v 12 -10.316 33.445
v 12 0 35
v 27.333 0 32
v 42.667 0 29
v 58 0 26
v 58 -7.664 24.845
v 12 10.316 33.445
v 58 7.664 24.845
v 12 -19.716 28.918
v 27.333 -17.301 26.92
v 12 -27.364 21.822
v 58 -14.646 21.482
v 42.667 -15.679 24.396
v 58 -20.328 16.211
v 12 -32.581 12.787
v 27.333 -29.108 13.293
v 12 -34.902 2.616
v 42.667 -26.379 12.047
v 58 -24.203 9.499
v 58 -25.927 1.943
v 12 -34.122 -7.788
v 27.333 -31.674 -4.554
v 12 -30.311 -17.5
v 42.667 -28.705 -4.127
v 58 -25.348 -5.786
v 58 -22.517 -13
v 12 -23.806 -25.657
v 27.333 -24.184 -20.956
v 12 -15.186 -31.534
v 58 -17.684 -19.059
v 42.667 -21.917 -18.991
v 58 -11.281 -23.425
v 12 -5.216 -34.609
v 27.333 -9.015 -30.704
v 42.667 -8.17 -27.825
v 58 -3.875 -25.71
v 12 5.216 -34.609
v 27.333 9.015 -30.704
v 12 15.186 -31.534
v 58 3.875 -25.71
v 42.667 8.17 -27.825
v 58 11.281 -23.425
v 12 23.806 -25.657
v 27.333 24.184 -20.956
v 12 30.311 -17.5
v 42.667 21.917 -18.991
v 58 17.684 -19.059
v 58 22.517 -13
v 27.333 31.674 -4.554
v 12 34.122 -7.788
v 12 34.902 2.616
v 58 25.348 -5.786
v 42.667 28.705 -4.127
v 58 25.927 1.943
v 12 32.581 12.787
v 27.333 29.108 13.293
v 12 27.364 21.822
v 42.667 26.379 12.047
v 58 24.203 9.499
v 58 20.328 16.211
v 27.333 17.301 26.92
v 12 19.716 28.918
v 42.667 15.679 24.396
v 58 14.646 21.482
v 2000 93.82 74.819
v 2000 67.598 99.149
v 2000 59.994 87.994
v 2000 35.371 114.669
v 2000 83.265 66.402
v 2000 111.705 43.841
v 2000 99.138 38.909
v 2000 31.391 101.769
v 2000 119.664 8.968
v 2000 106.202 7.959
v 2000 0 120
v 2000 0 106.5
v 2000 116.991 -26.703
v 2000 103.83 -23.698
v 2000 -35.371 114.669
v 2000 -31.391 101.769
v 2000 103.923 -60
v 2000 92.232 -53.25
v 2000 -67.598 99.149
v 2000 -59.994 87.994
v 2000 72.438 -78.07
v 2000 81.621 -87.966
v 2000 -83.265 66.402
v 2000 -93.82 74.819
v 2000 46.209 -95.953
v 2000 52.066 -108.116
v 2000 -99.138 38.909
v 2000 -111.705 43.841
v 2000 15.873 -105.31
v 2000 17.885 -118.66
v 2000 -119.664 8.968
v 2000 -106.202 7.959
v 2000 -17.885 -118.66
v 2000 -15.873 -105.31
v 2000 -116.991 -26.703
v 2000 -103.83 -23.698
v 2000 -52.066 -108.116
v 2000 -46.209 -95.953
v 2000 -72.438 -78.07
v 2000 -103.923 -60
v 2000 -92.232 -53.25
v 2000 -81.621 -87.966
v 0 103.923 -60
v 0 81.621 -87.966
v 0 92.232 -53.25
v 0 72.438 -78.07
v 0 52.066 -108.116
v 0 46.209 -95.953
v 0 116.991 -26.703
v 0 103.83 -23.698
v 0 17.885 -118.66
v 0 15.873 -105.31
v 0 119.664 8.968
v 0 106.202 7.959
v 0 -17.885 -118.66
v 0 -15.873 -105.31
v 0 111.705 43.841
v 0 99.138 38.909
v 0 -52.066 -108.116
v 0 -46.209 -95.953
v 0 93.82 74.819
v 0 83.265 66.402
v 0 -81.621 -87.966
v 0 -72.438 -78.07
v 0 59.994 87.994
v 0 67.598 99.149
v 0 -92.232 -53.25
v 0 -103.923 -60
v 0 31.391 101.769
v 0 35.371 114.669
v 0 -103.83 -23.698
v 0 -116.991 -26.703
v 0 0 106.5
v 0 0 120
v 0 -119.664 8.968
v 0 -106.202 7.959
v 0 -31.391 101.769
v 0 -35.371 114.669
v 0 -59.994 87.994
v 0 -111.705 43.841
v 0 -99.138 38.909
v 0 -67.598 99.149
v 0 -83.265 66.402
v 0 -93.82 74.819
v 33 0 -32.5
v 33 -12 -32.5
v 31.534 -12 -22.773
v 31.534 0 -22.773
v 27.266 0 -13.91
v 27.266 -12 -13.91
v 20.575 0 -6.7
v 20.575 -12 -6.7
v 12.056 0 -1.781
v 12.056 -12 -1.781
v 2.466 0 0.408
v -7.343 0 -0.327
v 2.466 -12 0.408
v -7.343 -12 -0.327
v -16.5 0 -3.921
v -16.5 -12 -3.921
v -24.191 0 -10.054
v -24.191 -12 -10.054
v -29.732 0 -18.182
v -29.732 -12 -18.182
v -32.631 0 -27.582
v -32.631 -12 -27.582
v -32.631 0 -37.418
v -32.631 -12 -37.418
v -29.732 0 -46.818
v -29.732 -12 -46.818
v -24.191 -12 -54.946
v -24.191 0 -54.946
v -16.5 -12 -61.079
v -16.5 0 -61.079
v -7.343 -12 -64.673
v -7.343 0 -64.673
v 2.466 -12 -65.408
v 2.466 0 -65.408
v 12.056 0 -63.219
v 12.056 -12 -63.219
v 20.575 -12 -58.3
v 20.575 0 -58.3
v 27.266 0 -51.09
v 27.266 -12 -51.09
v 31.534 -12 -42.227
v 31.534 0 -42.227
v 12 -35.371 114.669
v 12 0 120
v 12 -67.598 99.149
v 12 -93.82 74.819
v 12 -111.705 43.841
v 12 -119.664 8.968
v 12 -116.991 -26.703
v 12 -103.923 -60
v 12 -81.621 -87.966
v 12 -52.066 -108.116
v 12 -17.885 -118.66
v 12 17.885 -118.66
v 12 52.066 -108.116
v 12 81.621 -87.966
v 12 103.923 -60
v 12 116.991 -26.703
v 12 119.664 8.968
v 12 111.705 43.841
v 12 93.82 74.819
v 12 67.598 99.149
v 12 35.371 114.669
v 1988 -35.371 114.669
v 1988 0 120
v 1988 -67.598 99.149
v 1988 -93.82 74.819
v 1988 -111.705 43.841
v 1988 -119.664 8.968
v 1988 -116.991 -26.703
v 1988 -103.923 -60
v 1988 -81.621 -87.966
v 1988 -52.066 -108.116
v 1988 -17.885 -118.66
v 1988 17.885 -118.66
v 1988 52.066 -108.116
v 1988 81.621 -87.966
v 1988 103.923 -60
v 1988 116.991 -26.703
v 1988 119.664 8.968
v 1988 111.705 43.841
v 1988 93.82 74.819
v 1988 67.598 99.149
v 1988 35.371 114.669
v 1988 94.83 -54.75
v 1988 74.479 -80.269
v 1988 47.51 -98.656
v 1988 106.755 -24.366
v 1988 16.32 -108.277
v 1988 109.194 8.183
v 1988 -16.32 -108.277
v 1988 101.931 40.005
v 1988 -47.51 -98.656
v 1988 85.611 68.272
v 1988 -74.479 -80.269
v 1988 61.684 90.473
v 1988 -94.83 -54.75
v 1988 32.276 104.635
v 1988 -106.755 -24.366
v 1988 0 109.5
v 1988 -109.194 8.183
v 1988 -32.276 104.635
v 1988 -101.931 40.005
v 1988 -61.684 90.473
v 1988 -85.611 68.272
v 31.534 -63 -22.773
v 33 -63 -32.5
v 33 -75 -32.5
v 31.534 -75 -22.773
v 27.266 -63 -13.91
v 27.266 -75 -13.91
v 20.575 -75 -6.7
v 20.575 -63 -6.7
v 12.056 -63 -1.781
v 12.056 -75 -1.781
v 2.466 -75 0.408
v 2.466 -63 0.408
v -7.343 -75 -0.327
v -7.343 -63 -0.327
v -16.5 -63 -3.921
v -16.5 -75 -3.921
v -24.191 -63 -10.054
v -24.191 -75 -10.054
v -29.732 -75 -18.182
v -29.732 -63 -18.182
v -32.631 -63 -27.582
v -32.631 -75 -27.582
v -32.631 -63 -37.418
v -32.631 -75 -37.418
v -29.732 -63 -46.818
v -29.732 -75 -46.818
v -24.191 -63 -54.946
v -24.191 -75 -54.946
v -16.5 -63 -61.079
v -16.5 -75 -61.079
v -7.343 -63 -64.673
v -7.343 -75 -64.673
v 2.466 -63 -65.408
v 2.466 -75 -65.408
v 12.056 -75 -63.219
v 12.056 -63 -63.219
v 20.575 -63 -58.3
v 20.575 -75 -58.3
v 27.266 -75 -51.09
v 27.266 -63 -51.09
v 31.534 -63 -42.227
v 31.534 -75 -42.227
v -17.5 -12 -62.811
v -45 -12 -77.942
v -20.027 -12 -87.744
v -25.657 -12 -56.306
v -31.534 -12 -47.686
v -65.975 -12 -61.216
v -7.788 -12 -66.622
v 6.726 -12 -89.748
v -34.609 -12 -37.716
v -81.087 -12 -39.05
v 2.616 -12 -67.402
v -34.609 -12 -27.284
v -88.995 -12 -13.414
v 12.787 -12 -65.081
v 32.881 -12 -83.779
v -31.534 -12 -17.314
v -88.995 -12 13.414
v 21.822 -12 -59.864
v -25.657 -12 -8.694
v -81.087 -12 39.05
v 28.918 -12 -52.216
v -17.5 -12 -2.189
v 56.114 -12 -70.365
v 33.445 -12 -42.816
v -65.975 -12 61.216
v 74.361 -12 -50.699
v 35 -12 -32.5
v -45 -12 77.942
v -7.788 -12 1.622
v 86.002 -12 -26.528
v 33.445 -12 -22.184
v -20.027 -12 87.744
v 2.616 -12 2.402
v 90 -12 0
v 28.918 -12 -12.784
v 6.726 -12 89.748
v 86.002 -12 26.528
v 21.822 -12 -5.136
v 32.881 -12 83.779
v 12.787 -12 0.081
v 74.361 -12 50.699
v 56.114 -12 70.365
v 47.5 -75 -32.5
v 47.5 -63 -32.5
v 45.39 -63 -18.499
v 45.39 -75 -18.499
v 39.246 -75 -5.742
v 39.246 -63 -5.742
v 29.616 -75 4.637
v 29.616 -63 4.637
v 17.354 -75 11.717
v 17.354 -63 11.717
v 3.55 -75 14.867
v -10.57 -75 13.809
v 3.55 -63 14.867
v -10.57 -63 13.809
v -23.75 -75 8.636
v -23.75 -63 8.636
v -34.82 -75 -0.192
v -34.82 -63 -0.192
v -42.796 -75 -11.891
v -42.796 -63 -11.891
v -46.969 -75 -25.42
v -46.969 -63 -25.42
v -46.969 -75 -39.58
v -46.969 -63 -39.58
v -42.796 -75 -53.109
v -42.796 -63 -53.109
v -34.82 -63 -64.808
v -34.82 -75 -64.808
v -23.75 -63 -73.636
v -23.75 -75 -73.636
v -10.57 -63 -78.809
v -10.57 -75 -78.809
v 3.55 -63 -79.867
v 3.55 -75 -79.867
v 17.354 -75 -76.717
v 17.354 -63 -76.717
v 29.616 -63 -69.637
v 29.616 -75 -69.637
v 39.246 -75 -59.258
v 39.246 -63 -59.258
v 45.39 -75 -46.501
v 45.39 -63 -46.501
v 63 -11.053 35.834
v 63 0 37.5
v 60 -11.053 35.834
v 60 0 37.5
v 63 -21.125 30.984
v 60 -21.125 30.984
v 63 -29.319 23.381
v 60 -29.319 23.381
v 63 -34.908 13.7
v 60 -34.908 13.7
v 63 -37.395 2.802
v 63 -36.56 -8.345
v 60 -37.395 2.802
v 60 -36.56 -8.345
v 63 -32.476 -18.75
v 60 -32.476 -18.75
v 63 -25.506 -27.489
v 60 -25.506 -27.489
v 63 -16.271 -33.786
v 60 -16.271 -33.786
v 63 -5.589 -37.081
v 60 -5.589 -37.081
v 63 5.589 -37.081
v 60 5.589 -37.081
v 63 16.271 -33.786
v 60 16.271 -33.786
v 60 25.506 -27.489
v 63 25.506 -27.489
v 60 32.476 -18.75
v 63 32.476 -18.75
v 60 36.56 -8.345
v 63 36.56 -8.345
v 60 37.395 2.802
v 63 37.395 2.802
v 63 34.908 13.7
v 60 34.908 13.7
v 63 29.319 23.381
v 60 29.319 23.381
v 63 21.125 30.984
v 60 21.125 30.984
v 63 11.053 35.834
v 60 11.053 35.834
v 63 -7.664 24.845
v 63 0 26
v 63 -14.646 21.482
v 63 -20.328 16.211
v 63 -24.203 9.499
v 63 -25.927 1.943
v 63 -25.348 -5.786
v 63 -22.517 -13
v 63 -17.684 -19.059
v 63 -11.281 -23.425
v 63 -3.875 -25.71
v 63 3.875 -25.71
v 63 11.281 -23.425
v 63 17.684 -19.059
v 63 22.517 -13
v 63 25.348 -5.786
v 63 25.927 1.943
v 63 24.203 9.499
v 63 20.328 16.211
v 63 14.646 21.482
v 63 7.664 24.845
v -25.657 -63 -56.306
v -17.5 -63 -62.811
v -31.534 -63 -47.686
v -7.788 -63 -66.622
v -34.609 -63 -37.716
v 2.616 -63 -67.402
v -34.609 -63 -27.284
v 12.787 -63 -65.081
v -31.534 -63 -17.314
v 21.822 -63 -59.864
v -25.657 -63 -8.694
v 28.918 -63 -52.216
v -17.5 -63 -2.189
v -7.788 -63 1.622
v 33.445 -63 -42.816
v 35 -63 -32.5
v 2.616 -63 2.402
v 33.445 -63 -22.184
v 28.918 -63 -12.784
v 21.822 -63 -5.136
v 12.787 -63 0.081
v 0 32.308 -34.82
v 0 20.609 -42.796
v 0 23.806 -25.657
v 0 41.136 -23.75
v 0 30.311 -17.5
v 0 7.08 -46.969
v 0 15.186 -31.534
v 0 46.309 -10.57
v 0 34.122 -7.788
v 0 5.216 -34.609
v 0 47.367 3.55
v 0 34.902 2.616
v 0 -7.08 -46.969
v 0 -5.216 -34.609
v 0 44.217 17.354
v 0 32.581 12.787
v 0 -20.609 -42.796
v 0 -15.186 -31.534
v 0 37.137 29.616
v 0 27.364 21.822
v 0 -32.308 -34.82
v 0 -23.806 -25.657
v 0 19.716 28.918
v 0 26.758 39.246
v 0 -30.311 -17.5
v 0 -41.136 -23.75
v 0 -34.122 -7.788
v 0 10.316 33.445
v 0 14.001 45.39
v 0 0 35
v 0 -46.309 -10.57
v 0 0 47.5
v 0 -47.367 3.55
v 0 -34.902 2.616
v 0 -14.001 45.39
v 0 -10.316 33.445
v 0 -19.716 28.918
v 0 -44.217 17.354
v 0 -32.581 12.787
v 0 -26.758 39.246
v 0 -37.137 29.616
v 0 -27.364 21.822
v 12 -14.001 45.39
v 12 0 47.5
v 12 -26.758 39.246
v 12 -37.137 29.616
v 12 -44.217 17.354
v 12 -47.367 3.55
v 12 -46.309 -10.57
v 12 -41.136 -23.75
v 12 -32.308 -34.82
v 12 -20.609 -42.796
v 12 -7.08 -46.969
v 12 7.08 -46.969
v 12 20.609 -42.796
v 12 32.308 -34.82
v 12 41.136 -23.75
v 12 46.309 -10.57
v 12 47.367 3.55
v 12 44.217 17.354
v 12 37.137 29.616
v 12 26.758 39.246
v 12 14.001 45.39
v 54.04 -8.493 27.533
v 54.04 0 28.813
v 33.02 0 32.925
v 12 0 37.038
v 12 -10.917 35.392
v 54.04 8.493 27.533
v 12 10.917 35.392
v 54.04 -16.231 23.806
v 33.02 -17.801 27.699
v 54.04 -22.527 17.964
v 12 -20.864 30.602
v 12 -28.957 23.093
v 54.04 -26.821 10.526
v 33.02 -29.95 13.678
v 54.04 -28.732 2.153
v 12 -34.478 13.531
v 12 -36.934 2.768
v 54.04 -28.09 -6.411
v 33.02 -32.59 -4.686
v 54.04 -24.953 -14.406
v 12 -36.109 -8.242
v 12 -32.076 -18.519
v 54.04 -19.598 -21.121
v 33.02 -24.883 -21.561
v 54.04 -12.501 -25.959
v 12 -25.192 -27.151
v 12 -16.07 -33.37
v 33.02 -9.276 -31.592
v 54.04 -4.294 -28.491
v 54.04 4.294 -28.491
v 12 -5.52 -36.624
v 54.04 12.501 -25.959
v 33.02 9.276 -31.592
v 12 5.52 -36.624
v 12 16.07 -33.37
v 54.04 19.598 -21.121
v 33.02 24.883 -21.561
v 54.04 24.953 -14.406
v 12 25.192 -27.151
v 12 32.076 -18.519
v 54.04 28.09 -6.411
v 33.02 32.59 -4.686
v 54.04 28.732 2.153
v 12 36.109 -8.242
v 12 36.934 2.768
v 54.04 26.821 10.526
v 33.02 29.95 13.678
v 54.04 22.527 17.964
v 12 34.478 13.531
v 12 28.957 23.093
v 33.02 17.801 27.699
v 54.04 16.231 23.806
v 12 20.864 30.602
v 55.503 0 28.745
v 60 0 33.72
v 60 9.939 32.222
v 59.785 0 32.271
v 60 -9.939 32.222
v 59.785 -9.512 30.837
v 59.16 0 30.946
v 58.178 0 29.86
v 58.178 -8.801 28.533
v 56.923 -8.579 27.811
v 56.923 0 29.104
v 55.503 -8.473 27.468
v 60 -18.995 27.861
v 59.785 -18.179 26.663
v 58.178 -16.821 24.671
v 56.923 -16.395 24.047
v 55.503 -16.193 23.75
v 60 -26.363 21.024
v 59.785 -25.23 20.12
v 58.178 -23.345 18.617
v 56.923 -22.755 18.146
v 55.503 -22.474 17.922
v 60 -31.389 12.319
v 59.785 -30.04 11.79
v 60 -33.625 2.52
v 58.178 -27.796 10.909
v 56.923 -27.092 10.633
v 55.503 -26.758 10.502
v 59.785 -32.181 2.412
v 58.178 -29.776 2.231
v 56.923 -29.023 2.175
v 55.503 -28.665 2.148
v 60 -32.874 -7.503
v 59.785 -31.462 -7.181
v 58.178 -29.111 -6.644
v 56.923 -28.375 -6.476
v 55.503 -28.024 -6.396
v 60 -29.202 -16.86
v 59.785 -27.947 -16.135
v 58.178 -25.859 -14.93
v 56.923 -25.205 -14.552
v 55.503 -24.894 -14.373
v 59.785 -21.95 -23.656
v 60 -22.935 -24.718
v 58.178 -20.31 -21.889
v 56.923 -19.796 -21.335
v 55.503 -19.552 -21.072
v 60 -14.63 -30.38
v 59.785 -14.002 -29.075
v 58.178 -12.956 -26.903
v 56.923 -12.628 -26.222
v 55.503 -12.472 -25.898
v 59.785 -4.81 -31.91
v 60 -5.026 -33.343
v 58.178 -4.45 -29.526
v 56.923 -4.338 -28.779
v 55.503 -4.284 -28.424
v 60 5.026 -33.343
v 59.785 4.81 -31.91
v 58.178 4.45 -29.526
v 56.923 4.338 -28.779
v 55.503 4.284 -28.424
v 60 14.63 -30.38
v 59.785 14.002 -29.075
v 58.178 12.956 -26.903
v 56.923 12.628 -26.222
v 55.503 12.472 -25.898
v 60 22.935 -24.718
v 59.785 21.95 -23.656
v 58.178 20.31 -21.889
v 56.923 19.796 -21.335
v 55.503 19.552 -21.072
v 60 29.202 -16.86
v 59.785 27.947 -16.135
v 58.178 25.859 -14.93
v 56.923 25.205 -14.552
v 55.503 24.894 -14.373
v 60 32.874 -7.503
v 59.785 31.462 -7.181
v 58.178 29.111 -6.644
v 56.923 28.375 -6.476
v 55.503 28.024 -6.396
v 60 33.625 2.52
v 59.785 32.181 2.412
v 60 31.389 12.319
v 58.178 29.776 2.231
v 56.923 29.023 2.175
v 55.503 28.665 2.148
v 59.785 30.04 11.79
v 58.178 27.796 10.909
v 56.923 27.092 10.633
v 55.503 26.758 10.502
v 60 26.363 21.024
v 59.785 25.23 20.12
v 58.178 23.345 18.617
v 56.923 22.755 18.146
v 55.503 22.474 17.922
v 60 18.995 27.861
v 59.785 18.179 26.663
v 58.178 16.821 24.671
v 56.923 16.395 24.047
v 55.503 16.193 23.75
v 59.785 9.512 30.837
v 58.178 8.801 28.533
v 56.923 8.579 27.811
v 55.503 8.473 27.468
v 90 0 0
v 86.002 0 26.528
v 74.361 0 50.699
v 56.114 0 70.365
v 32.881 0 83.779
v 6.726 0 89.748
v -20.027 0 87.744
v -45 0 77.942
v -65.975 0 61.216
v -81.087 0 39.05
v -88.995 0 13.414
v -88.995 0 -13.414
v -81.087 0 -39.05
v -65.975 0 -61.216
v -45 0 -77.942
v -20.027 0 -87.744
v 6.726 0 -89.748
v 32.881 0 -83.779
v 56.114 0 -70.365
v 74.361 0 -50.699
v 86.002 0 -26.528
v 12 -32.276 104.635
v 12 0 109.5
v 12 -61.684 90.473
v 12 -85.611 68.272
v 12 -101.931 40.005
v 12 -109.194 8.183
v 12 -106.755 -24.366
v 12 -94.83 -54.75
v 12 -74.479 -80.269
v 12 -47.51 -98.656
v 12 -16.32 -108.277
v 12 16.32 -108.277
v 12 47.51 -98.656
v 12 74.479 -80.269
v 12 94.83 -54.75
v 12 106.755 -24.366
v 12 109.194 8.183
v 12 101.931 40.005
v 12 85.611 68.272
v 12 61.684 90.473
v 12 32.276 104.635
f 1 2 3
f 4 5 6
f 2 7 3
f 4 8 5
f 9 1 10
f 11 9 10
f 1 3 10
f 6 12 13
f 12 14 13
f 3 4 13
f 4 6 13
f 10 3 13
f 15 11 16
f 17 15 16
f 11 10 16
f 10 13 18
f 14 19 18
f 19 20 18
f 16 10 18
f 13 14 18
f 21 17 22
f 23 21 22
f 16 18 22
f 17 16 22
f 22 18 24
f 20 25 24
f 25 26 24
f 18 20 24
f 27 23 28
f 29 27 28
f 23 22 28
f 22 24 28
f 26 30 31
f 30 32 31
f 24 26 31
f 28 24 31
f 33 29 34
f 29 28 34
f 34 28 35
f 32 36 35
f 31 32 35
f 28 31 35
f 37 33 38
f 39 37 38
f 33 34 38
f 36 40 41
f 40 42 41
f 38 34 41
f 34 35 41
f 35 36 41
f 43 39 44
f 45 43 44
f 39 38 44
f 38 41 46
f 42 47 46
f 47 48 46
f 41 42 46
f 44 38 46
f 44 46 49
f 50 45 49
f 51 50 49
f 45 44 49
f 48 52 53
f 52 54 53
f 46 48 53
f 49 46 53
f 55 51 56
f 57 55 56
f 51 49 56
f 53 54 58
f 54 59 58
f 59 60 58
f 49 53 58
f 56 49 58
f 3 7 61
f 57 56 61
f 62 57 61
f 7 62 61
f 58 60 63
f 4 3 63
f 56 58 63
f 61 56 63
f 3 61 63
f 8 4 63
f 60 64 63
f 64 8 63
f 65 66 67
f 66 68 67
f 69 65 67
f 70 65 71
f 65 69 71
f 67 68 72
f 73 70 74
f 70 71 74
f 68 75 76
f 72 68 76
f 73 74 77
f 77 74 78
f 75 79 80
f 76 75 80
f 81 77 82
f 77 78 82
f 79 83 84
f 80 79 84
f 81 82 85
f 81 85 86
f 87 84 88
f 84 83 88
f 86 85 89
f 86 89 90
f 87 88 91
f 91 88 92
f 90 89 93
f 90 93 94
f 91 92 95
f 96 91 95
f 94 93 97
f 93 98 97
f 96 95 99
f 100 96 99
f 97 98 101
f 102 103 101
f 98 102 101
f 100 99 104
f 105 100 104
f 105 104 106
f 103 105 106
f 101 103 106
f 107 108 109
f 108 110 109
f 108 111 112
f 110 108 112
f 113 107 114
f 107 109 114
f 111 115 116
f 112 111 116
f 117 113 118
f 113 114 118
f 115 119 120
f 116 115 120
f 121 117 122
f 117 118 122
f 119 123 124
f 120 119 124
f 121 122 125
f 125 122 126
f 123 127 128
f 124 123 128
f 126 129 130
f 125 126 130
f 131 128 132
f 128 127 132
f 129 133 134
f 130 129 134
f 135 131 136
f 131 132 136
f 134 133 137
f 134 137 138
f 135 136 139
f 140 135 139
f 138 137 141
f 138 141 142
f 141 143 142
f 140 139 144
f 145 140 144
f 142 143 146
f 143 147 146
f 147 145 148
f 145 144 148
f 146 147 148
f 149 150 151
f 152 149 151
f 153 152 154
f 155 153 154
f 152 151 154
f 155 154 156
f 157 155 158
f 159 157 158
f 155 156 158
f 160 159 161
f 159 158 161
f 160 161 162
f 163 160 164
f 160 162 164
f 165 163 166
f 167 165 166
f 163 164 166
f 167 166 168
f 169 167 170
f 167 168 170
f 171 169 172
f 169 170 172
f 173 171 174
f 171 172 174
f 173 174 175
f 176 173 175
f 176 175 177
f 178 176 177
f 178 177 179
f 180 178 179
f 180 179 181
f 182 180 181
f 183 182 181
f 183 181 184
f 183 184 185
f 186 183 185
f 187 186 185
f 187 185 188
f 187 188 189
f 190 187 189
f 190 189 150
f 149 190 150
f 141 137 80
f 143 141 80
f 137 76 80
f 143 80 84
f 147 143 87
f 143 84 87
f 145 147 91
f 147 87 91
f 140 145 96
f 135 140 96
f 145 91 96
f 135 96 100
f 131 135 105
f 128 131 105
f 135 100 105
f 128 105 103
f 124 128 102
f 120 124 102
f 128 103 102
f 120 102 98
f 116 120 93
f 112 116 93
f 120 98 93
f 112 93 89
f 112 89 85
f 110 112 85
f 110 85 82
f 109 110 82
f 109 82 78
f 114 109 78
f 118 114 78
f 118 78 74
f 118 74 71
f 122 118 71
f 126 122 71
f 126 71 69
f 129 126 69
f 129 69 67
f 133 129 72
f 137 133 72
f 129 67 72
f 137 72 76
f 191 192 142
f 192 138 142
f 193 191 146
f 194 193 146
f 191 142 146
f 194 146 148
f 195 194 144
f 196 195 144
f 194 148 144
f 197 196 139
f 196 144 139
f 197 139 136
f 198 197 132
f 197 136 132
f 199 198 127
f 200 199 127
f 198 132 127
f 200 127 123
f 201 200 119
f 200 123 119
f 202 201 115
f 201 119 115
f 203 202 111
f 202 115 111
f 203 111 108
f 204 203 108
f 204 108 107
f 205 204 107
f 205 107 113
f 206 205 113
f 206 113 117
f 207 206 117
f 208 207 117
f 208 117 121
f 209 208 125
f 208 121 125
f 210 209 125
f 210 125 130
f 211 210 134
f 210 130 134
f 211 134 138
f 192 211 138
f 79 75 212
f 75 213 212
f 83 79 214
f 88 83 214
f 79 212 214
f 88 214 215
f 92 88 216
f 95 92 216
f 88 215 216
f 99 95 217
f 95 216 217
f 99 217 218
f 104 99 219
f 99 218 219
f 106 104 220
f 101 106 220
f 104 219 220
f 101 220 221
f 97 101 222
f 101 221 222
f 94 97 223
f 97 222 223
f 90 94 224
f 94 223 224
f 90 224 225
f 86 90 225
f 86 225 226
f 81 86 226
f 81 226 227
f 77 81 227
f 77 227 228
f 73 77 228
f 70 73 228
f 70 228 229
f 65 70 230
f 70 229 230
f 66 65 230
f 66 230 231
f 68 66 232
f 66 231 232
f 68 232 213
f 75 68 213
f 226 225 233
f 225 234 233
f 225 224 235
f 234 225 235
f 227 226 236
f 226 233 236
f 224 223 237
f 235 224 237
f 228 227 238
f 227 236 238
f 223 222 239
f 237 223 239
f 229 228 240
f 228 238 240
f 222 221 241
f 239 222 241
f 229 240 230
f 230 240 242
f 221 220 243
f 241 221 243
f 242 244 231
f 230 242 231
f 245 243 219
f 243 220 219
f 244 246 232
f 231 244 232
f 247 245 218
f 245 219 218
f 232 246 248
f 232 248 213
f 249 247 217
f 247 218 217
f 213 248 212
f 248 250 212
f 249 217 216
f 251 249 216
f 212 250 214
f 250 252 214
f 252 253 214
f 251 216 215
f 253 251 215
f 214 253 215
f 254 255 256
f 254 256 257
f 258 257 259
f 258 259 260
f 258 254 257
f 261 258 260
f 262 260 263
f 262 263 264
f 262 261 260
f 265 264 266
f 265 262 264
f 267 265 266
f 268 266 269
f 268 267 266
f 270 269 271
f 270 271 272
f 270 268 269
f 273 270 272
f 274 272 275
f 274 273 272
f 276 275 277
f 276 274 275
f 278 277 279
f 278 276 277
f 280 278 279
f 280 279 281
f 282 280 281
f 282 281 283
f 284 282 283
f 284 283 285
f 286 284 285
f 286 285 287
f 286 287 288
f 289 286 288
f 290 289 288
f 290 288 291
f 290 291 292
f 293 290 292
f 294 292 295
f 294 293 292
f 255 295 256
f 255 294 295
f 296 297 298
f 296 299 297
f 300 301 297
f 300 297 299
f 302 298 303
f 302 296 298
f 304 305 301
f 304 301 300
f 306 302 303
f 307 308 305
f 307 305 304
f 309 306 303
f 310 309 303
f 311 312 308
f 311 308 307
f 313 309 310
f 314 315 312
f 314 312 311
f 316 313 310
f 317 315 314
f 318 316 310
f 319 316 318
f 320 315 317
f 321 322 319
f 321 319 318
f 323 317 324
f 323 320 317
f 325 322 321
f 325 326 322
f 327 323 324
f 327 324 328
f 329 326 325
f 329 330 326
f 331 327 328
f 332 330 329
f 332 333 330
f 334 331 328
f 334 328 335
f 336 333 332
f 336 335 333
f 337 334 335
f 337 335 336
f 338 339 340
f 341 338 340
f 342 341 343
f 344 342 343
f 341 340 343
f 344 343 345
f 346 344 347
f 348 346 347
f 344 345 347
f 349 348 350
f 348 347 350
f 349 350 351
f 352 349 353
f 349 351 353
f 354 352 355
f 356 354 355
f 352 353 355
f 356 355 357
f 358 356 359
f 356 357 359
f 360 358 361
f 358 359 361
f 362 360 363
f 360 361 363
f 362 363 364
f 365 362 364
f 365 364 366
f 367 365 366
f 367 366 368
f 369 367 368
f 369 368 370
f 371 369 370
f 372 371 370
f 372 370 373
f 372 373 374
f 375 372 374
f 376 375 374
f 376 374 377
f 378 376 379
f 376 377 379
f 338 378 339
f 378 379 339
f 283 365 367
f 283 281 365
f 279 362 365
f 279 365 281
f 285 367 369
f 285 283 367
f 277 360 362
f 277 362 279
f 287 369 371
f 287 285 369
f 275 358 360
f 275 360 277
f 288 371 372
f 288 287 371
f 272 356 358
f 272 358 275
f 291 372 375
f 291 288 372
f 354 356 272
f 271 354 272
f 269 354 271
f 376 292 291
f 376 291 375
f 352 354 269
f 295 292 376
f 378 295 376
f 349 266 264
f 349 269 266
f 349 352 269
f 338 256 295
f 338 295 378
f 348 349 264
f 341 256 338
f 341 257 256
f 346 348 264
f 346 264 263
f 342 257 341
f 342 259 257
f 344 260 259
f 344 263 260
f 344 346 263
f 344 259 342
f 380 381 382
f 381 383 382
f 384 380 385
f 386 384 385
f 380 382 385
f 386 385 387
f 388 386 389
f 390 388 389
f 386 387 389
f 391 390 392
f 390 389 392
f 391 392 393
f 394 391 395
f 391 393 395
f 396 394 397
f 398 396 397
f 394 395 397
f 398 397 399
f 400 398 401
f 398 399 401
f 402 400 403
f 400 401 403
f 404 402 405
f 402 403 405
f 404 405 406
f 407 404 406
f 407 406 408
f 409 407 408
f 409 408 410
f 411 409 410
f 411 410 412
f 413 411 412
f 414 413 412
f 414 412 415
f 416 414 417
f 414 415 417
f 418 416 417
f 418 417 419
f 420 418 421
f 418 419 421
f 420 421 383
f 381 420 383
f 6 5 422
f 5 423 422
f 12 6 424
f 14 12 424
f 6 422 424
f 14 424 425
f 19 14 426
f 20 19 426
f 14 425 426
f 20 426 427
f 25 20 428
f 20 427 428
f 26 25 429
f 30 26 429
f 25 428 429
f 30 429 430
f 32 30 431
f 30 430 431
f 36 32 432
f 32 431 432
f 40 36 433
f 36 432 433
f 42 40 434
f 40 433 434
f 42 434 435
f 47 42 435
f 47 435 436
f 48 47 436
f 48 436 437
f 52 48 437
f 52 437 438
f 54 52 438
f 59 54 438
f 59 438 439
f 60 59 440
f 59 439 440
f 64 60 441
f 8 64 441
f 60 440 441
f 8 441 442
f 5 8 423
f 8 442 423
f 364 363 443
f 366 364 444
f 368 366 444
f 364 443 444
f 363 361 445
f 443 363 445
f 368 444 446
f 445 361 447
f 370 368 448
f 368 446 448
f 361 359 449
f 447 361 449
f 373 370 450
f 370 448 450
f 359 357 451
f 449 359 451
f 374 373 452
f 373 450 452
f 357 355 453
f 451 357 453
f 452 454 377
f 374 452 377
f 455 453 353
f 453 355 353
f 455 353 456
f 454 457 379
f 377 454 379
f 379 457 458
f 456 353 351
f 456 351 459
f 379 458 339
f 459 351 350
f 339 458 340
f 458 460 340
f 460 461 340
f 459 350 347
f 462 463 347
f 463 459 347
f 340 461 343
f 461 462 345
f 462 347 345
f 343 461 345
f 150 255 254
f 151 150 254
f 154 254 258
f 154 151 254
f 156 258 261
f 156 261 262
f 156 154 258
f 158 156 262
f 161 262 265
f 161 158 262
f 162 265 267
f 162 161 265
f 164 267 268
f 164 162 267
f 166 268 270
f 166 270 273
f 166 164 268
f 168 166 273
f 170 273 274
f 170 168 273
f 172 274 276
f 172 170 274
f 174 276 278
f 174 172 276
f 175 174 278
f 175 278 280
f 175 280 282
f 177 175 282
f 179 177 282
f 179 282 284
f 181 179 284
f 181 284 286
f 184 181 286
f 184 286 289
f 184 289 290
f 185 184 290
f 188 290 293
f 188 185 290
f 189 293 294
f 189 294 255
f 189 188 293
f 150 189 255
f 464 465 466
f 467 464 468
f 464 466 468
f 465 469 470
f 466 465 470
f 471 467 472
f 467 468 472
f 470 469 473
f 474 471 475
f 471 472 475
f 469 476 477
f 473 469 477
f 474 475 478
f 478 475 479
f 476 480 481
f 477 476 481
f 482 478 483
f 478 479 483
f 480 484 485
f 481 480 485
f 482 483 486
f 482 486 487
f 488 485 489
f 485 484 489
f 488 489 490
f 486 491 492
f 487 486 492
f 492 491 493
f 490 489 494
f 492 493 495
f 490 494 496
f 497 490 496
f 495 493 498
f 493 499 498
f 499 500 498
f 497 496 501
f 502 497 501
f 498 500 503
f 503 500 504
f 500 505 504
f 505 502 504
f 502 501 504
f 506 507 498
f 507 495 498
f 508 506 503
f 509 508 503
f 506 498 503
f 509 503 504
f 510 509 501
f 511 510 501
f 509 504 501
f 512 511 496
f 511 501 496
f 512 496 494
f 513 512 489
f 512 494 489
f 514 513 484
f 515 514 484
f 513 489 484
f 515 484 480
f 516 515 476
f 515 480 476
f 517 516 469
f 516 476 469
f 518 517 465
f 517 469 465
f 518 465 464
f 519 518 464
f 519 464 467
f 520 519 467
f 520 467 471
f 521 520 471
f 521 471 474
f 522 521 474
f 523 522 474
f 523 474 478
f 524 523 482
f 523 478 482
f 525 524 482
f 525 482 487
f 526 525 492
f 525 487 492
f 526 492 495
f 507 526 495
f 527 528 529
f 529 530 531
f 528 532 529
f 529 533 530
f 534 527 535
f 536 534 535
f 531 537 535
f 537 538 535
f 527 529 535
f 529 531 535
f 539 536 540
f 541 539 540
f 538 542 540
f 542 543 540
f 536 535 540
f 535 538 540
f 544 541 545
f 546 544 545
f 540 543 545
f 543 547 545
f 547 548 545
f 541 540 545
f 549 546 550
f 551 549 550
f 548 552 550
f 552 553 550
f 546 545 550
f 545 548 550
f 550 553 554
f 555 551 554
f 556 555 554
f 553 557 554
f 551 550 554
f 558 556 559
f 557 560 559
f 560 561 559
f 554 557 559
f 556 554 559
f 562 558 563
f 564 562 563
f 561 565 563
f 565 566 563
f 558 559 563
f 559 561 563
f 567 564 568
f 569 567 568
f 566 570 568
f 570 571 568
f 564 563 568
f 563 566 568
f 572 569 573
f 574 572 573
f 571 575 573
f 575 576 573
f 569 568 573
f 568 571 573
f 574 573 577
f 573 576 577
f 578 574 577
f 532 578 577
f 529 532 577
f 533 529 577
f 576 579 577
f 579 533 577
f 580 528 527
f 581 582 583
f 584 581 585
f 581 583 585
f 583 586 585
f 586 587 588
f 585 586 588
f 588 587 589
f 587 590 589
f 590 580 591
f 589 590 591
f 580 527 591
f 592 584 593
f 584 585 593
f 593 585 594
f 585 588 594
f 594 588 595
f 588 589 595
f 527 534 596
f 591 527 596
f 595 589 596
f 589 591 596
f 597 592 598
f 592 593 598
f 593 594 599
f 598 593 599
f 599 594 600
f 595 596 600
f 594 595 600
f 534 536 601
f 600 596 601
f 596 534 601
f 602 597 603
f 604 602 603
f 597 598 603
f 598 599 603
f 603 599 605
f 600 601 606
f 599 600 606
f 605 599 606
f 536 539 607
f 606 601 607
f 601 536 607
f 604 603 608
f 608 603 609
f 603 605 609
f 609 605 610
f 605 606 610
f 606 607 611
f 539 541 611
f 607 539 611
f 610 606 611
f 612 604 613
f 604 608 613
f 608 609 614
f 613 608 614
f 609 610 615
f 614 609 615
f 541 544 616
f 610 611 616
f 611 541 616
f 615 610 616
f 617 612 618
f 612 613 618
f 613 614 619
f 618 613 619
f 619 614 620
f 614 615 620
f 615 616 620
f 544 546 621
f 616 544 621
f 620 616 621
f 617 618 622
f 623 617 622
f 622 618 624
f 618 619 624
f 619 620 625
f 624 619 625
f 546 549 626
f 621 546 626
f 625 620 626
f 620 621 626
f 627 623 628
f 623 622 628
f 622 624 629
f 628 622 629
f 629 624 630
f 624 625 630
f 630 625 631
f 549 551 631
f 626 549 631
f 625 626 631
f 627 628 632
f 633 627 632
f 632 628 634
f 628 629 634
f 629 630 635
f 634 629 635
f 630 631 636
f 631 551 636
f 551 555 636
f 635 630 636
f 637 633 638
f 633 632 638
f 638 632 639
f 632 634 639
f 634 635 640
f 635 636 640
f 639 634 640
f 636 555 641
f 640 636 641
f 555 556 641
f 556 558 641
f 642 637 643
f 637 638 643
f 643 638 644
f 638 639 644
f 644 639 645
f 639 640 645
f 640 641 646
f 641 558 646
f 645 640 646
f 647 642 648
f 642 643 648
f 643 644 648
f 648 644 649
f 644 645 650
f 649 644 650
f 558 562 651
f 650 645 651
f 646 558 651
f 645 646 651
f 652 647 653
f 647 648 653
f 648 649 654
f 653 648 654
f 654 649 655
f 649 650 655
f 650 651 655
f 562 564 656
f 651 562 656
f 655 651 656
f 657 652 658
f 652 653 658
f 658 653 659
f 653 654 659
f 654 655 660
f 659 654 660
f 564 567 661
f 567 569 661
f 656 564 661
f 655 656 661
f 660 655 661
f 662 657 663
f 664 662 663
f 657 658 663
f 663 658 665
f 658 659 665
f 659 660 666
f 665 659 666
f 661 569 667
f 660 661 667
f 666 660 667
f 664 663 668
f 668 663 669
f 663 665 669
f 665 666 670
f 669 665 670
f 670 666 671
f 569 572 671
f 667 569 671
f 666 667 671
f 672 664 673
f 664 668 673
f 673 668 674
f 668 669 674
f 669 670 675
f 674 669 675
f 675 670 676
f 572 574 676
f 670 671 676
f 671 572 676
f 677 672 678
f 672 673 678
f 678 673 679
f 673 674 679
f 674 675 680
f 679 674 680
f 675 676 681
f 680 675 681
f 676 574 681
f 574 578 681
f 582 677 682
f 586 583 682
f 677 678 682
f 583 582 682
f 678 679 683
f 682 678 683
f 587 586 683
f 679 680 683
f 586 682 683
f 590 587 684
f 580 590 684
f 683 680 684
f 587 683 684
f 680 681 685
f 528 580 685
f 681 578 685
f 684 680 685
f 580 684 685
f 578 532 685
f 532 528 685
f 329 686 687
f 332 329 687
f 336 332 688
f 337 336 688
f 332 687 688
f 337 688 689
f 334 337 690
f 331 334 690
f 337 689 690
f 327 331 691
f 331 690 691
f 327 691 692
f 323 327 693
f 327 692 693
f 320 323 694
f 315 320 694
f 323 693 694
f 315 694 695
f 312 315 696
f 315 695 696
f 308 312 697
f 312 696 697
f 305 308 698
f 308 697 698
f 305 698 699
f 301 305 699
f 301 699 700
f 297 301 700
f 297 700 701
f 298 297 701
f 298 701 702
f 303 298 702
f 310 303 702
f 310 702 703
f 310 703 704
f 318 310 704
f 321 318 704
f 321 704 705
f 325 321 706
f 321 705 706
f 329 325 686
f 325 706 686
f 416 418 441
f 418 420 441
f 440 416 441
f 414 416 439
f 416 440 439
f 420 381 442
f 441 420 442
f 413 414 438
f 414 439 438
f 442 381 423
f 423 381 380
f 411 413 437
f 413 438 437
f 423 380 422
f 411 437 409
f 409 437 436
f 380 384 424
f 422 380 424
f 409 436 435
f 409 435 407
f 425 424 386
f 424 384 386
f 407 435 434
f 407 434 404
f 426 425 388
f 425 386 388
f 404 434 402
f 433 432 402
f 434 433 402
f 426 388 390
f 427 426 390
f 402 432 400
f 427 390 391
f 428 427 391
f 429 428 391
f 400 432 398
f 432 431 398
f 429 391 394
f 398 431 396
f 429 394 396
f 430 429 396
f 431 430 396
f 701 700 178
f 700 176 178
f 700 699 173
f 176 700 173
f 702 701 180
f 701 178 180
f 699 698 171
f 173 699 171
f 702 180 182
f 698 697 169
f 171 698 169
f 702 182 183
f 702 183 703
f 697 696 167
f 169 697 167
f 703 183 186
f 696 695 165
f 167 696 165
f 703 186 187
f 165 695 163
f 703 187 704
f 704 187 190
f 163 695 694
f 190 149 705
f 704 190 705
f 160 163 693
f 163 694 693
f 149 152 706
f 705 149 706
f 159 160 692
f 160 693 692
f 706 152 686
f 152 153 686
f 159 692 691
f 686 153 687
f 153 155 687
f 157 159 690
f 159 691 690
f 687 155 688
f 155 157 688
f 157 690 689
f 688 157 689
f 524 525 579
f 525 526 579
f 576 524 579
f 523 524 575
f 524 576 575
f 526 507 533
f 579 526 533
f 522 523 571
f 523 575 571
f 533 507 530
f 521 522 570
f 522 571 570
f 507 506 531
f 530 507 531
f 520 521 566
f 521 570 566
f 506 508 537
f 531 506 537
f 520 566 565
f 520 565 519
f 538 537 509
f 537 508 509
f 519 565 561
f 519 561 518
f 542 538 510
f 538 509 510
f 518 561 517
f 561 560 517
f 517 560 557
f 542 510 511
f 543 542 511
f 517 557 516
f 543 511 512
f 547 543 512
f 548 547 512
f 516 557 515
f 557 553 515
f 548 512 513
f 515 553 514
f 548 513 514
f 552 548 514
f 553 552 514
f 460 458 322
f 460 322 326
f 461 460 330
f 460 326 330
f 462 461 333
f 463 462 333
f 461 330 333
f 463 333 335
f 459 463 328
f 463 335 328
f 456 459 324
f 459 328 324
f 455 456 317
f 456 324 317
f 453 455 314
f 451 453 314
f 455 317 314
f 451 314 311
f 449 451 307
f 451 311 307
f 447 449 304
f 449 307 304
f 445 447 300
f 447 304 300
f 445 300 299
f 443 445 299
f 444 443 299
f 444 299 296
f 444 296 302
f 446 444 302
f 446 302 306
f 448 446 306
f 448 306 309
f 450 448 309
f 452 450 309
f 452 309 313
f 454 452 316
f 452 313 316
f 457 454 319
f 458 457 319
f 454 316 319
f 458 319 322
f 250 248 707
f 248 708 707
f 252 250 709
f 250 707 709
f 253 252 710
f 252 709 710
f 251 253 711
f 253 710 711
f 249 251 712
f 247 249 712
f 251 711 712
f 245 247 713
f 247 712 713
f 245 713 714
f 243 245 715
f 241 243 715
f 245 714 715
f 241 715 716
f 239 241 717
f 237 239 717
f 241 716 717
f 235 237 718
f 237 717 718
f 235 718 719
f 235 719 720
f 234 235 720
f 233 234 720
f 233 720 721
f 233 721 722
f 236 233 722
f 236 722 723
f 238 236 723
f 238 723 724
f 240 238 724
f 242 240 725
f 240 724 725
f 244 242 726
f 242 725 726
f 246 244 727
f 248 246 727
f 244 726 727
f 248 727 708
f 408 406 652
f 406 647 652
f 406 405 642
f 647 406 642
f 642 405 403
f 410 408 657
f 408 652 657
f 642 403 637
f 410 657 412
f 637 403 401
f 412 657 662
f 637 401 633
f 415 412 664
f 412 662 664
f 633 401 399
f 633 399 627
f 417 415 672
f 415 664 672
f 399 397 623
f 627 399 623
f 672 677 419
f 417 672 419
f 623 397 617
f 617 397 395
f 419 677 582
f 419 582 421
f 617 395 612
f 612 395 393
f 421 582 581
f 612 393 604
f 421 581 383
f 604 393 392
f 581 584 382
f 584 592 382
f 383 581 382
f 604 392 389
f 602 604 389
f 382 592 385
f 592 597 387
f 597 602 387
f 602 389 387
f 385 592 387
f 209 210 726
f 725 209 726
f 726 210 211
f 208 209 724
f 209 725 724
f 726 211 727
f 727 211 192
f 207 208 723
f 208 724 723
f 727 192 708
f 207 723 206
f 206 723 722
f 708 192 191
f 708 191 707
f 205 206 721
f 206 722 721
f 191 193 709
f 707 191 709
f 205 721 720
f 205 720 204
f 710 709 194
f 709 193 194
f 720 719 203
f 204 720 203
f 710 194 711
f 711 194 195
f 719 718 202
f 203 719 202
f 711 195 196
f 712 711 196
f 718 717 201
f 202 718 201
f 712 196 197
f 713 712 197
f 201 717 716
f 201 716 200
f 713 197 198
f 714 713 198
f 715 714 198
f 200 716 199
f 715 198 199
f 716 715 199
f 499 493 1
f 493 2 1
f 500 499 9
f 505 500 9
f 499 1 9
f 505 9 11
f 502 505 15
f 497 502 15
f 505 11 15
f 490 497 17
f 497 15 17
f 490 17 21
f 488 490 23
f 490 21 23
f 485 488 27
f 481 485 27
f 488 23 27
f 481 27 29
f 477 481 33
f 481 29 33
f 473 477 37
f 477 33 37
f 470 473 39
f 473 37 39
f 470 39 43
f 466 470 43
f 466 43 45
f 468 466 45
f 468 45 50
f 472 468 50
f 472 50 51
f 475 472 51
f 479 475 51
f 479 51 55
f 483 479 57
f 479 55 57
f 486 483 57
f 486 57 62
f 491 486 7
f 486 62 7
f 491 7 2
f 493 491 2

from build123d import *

# Parameters (mm, degrees)
F3_R     = 90
F4_DEPTH = 12
F5_R     = 35
F5_R_2   = 33
F6_DEPTH = 51
F7_DEPTH = 132.001
F8_R     = 47.5
F8_R_2   = 35
F8_R_3   = 33
F9_DEPTH = 12


with BuildPart() as f2:
    # F0 (on Front) → F2 (revolve)
    with BuildSketch(Plane.XZ):
        Polygon((0, 120), (0, 106.5), (2000, 106.5), (2000, 120), (1988, 120), (1988, 109.5), (12, 109.5), (12, 120), align=None)
    revolve(axis=Axis((45.6891432405, 0, 0), (1, 0, 0)))


with BuildPart() as f4:
    # F3 (on Front) → F4 (new body)
    with BuildSketch(Plane.XZ):
        Circle(F3_R)
    extrude(amount=F4_DEPTH)

    # F5 (on face) → F6 (join)
    with BuildSketch(Plane.XZ.offset(12)):
        with Locations((0, -32.5)):
            Circle(F5_R)
        with Locations((0, -32.5)):
            Circle(F5_R_2, mode=Mode.SUBTRACT)
    extrude(amount=F6_DEPTH)

    # F5 (on face) → F7 (cut, through all)
    with BuildSketch(Plane.XZ.offset(12)):
        with Locations((0, -32.5)):
            Circle(F5_R_2)
    extrude(amount=-F7_DEPTH, mode=Mode.SUBTRACT)

    # F8 (on face) → F9 (join)
    with BuildSketch(Plane.XZ.offset(63)):
        with Locations((0, -32.5)):
            Circle(F8_R)
        with Locations((0, -32.5)):
            Circle(F8_R_2, mode=Mode.SUBTRACT)
        with Locations((0, -32.5)):
            Circle(F8_R_2)
        with Locations((0, -32.5)):
            Circle(F8_R_3, mode=Mode.SUBTRACT)
    extrude(amount=F9_DEPTH)


with BuildPart() as f12:
    # F10 (on Front) → F12 (revolve)
    with BuildSketch(Plane.XZ):
        with BuildLine():
            Line((0, 47.5), (0, 35))
            Line((0, 35), (12, 35))
            Line((12, 35), (58, 26))
            Line((58, 26), (63, 26))
            Line((63, 26), (63, 37.5))
            Line((63, 37.5), (60, 37.5))
            Line((60, 37.5), (60, 33.7196775232))
            ThreePointArc((60, 33.7196775232), (58.178026891, 29.8596069177), (54.0399419681, 28.8127142489))
            Line((54.0399419681, 28.8127142489), (12, 37.0379202861))
            Line((12, 37.0379202861), (12, 47.5))
            Line((12, 47.5), (0, 47.5))
        make_face()
    revolve(axis=Axis((33.8844247162, 0, 0), (1, 0, 0)))


solid = Compound([f2.part, f4.part, f12.part])
